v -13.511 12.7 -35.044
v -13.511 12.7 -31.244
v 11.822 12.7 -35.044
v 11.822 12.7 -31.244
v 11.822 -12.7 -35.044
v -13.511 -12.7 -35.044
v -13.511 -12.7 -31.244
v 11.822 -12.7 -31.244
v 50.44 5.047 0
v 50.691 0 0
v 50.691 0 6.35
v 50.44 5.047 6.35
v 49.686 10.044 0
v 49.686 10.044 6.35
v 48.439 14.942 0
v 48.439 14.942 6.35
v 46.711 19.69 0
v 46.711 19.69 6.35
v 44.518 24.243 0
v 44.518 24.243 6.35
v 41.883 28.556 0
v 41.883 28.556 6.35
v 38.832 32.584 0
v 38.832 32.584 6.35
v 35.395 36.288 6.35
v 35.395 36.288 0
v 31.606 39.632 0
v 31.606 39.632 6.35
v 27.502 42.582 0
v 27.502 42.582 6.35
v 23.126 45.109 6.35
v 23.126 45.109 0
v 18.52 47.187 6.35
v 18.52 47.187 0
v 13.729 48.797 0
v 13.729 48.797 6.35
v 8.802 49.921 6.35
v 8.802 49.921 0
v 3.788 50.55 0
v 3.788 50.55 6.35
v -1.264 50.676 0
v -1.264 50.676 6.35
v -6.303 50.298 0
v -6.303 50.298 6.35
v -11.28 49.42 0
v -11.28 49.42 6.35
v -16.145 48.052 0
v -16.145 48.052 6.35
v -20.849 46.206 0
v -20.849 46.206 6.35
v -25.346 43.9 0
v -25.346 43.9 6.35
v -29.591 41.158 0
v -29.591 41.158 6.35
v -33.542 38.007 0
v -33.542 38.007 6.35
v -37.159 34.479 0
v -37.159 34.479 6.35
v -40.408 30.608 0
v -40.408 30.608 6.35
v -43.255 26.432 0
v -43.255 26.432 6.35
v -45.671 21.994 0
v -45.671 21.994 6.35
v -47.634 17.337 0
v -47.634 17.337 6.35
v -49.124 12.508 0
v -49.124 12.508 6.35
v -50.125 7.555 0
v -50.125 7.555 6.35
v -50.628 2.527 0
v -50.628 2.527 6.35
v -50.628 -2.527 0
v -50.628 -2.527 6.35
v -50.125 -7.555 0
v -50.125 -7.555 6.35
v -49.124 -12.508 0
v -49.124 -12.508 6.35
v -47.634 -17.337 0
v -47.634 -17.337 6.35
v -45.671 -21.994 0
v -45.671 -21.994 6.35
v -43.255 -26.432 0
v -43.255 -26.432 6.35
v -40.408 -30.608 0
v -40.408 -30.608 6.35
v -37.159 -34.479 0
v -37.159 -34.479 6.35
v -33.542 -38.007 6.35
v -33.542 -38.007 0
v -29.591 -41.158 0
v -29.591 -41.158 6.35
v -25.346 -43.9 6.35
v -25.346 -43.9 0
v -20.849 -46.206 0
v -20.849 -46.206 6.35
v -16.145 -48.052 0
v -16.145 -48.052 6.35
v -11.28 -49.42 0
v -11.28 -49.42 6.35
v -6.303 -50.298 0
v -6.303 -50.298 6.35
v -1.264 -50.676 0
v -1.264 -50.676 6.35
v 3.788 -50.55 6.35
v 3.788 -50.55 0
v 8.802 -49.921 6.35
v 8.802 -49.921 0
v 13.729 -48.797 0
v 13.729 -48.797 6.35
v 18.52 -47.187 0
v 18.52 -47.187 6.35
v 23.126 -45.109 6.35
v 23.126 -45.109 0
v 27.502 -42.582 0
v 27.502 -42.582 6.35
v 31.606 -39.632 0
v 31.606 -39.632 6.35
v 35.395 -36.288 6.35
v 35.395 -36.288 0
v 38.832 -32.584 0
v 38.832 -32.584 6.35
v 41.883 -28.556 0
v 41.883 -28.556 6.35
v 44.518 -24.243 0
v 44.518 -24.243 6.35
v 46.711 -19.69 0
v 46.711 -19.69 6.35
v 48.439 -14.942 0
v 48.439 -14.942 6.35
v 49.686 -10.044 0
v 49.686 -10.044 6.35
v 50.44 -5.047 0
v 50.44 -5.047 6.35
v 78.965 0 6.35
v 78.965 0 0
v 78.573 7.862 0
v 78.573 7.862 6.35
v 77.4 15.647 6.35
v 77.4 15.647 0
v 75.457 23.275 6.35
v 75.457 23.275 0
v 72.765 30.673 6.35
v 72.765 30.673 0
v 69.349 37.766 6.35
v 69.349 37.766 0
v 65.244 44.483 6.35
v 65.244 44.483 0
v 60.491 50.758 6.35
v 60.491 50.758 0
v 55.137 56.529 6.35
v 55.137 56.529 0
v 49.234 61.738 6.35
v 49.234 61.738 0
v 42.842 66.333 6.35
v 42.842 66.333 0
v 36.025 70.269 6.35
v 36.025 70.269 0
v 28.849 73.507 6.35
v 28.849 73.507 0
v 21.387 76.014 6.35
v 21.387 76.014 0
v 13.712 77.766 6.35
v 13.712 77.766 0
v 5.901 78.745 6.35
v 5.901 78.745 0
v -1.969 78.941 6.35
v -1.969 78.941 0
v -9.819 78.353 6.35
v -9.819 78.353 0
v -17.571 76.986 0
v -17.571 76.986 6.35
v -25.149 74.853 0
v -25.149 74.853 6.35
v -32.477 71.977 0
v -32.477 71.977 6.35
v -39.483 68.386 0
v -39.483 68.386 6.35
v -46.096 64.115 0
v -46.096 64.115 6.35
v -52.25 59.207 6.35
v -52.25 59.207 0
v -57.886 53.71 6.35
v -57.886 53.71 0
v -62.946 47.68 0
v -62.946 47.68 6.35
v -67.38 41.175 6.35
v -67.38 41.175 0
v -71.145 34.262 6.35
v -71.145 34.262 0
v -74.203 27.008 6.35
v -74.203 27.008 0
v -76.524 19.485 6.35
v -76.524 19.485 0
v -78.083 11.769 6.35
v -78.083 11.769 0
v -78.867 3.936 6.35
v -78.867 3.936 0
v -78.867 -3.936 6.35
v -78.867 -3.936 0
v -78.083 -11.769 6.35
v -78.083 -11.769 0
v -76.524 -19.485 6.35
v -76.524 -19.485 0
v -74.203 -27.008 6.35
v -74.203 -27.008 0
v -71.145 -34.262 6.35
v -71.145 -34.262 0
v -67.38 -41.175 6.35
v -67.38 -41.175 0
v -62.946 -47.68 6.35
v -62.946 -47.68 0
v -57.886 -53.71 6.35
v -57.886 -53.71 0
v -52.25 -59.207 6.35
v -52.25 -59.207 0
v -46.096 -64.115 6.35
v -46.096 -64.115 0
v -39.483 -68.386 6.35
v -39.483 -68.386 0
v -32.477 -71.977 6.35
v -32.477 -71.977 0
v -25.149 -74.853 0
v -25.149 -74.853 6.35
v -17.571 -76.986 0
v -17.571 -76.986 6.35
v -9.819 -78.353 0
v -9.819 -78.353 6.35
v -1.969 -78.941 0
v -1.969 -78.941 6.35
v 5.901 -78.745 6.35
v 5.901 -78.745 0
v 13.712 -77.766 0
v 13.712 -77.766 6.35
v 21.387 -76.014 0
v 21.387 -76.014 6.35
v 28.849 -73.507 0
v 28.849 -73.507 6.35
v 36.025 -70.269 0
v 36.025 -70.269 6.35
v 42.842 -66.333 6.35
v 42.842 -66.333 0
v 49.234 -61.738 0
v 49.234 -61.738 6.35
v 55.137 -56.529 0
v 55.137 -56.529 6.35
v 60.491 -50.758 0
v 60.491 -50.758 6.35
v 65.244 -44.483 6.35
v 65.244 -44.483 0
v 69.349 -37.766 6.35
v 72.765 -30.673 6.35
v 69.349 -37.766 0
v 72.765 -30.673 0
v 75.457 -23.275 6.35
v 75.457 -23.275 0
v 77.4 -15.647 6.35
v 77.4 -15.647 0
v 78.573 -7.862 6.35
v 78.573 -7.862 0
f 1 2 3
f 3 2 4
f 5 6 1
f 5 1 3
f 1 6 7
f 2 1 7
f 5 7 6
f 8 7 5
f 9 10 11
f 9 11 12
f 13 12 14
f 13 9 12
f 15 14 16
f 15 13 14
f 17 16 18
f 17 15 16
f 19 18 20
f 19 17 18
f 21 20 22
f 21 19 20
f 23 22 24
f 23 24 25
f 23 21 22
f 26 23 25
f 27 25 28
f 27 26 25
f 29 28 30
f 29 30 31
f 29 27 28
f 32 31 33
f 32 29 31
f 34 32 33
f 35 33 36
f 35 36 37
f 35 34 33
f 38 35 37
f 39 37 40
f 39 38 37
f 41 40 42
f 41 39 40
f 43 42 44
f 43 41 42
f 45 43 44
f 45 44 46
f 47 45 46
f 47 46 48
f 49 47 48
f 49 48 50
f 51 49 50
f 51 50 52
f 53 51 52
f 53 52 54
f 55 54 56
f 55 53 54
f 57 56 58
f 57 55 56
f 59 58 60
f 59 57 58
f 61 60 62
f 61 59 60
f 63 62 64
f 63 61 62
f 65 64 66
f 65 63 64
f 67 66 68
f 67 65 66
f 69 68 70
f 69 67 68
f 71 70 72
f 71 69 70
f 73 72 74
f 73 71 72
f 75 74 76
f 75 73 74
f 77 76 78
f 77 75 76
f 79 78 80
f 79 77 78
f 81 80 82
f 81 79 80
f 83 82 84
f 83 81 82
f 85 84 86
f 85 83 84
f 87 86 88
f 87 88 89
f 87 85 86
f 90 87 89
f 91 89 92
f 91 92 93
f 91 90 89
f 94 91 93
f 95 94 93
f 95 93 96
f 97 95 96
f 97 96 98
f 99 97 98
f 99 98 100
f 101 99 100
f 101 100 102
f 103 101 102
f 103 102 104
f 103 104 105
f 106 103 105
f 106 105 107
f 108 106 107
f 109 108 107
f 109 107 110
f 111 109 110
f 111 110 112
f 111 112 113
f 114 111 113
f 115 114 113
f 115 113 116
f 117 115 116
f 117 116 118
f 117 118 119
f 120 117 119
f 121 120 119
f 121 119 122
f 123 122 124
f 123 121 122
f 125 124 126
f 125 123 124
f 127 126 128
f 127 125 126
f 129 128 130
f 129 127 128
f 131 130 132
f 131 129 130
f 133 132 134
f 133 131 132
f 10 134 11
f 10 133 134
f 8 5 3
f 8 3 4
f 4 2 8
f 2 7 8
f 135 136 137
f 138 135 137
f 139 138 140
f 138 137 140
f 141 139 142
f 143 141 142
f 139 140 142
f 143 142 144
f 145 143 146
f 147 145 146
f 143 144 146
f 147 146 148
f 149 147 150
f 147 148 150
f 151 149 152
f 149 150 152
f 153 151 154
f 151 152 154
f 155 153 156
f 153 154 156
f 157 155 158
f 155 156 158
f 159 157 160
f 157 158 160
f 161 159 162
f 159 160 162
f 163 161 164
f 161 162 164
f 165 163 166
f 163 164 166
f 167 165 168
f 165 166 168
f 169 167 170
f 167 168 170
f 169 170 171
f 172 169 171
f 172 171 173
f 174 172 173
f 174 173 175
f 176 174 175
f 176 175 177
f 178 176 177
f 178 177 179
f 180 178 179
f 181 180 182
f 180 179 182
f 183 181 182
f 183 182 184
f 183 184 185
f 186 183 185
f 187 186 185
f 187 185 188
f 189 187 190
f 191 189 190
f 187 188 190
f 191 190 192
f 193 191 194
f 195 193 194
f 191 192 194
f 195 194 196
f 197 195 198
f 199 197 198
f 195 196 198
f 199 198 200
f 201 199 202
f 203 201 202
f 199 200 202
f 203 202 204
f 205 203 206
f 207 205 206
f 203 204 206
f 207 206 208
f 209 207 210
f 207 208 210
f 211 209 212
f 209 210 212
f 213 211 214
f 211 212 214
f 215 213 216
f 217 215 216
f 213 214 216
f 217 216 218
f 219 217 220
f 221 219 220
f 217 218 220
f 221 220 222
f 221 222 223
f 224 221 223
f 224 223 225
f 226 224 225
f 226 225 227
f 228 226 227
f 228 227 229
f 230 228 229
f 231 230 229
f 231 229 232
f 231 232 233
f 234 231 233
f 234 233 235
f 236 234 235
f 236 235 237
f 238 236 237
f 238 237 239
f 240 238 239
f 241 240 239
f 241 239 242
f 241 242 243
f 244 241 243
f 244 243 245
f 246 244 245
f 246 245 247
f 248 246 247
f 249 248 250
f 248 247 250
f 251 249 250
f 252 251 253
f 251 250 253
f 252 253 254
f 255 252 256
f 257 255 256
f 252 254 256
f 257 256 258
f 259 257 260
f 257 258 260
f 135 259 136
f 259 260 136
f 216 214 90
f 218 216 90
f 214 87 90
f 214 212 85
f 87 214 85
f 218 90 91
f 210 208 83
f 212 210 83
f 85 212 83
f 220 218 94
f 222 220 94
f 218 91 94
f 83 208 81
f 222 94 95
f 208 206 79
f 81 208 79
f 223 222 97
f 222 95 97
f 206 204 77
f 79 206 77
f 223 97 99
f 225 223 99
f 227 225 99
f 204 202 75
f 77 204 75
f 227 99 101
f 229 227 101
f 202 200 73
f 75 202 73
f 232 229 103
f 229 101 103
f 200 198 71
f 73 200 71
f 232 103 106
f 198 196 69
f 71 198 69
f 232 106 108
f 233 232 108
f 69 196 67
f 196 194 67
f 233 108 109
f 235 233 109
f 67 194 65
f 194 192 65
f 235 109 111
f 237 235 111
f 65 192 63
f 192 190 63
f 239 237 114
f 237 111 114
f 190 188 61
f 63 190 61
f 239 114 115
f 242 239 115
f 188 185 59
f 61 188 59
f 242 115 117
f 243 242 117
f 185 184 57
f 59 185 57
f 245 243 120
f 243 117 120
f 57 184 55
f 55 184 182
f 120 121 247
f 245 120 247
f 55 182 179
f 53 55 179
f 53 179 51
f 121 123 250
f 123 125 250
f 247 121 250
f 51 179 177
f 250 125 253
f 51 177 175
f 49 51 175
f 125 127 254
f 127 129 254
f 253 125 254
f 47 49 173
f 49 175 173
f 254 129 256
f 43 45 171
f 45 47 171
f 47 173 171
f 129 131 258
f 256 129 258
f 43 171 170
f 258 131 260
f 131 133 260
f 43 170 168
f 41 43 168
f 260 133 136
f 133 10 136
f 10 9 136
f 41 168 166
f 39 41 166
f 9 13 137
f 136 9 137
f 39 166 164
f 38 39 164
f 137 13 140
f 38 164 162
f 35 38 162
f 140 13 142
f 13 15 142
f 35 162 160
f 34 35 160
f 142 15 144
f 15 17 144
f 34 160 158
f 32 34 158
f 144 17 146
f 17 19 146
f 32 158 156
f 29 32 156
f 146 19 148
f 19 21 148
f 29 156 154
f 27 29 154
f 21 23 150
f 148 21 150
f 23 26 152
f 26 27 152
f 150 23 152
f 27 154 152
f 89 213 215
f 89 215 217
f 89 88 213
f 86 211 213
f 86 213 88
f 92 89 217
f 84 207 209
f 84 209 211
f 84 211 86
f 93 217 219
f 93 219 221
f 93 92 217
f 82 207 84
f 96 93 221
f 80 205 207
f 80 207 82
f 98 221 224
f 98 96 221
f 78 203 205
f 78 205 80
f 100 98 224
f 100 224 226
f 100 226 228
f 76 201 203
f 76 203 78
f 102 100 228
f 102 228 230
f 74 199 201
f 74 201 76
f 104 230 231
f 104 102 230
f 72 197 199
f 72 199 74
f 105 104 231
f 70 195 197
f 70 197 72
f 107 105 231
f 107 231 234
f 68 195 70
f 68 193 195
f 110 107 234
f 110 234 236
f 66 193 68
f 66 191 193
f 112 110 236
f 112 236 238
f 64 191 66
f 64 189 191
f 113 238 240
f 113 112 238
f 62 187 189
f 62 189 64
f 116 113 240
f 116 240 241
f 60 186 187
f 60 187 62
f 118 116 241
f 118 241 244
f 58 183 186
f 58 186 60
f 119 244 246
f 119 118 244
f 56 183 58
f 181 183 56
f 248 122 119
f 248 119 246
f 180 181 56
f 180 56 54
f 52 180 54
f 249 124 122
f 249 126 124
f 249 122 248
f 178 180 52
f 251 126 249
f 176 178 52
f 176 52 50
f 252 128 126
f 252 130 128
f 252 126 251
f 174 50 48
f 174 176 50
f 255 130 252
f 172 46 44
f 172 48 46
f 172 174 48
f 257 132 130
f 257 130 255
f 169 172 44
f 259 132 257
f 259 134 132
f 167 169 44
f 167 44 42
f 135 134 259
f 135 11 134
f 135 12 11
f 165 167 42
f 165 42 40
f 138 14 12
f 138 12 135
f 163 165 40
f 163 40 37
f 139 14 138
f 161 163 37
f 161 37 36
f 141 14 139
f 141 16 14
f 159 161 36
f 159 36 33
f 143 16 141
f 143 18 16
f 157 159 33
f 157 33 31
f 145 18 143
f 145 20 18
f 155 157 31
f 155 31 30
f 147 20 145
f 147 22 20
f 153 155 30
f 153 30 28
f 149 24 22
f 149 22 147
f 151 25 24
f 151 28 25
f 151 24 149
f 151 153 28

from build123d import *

# Parameters (mm, degrees)
F1_W     = 25.3329826519
F1_H     = 3.7999469787
F2_DEPTH = 12.7
F0_R     = 78.9653812796
F0_R_2   = 50.6914401609
F5_DEPTH = 6.35


# Not quite as in the source:
# - the program builds the solid bodies; features that only make, move or delete a surface that nothing else refers to are left out


with BuildPart() as f2:
    # F1 (on Front) → F2 (new body, symmetric)
    with BuildSketch(Plane.XZ):
        with Locations((-0.8444325067, -33.1439850852)):
            Rectangle(F1_W, F1_H)
    extrude(amount=F2_DEPTH, both=True)


with BuildPart() as f5:
    # F0 (on Top) → F5 (new body)
    with BuildSketch(Plane.XY):
        Circle(F0_R)
        Circle(F0_R_2, mode=Mode.SUBTRACT)
    extrude(amount=F5_DEPTH)


solid = Compound([f2.part, f5.part])
